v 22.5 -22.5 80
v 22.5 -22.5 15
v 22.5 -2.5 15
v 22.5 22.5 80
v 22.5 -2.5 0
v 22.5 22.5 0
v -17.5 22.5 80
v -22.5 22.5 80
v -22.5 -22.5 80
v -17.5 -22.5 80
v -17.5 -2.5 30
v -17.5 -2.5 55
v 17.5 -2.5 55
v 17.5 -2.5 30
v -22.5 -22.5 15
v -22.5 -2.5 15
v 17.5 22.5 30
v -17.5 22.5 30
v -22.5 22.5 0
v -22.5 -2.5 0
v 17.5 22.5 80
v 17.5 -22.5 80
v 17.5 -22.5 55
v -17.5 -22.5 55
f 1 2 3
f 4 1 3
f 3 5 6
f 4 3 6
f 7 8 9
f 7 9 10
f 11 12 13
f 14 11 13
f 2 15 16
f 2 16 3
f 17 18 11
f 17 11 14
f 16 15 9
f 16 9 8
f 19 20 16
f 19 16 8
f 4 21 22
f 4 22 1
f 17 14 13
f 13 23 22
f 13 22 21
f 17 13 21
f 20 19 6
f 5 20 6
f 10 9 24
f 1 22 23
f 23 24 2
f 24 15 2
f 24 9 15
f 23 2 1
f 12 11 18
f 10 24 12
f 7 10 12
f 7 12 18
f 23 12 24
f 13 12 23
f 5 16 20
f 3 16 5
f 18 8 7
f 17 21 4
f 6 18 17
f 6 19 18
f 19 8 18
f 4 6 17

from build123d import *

# Parameters (mm, degrees)
F0_W     = 45
F0_H     = 45
F1_DEPTH = 80
F2_W     = 35
F2_H     = 20
F4_DEPTH = 25
F2_H_2   = 25
F5_DEPTH = 50
F3_W     = 45
F3_H     = 15
F6_DEPTH = 20


with BuildPart() as f1:
    # F0 (on Top) → F1 (new body)
    with BuildSketch(Plane.XY):
        Rectangle(F0_W, F0_H)
    extrude(amount=F1_DEPTH)

    # F2 (on face) → F4 (cut)
    with BuildSketch(Plane.XY.offset(80)):
        with Locations((0, -12.5)):
            Rectangle(F2_W, F2_H)
    extrude(amount=-F4_DEPTH, mode=Mode.SUBTRACT)

    # F2 (on face) → F5 (cut)
    with BuildSketch(Plane.XY.offset(80)):
        with Locations((0, 10)):
            Rectangle(F2_W, F2_H_2)
    extrude(amount=-F5_DEPTH, mode=Mode.SUBTRACT)

    # F3 (on face) → F6 (cut)
    with BuildSketch(Plane.XZ.offset(22.5)):
        with Locations((0, 7.5)):
            Rectangle(F3_W, F3_H)
    extrude(amount=-F6_DEPTH, mode=Mode.SUBTRACT)


solid = f1.part
